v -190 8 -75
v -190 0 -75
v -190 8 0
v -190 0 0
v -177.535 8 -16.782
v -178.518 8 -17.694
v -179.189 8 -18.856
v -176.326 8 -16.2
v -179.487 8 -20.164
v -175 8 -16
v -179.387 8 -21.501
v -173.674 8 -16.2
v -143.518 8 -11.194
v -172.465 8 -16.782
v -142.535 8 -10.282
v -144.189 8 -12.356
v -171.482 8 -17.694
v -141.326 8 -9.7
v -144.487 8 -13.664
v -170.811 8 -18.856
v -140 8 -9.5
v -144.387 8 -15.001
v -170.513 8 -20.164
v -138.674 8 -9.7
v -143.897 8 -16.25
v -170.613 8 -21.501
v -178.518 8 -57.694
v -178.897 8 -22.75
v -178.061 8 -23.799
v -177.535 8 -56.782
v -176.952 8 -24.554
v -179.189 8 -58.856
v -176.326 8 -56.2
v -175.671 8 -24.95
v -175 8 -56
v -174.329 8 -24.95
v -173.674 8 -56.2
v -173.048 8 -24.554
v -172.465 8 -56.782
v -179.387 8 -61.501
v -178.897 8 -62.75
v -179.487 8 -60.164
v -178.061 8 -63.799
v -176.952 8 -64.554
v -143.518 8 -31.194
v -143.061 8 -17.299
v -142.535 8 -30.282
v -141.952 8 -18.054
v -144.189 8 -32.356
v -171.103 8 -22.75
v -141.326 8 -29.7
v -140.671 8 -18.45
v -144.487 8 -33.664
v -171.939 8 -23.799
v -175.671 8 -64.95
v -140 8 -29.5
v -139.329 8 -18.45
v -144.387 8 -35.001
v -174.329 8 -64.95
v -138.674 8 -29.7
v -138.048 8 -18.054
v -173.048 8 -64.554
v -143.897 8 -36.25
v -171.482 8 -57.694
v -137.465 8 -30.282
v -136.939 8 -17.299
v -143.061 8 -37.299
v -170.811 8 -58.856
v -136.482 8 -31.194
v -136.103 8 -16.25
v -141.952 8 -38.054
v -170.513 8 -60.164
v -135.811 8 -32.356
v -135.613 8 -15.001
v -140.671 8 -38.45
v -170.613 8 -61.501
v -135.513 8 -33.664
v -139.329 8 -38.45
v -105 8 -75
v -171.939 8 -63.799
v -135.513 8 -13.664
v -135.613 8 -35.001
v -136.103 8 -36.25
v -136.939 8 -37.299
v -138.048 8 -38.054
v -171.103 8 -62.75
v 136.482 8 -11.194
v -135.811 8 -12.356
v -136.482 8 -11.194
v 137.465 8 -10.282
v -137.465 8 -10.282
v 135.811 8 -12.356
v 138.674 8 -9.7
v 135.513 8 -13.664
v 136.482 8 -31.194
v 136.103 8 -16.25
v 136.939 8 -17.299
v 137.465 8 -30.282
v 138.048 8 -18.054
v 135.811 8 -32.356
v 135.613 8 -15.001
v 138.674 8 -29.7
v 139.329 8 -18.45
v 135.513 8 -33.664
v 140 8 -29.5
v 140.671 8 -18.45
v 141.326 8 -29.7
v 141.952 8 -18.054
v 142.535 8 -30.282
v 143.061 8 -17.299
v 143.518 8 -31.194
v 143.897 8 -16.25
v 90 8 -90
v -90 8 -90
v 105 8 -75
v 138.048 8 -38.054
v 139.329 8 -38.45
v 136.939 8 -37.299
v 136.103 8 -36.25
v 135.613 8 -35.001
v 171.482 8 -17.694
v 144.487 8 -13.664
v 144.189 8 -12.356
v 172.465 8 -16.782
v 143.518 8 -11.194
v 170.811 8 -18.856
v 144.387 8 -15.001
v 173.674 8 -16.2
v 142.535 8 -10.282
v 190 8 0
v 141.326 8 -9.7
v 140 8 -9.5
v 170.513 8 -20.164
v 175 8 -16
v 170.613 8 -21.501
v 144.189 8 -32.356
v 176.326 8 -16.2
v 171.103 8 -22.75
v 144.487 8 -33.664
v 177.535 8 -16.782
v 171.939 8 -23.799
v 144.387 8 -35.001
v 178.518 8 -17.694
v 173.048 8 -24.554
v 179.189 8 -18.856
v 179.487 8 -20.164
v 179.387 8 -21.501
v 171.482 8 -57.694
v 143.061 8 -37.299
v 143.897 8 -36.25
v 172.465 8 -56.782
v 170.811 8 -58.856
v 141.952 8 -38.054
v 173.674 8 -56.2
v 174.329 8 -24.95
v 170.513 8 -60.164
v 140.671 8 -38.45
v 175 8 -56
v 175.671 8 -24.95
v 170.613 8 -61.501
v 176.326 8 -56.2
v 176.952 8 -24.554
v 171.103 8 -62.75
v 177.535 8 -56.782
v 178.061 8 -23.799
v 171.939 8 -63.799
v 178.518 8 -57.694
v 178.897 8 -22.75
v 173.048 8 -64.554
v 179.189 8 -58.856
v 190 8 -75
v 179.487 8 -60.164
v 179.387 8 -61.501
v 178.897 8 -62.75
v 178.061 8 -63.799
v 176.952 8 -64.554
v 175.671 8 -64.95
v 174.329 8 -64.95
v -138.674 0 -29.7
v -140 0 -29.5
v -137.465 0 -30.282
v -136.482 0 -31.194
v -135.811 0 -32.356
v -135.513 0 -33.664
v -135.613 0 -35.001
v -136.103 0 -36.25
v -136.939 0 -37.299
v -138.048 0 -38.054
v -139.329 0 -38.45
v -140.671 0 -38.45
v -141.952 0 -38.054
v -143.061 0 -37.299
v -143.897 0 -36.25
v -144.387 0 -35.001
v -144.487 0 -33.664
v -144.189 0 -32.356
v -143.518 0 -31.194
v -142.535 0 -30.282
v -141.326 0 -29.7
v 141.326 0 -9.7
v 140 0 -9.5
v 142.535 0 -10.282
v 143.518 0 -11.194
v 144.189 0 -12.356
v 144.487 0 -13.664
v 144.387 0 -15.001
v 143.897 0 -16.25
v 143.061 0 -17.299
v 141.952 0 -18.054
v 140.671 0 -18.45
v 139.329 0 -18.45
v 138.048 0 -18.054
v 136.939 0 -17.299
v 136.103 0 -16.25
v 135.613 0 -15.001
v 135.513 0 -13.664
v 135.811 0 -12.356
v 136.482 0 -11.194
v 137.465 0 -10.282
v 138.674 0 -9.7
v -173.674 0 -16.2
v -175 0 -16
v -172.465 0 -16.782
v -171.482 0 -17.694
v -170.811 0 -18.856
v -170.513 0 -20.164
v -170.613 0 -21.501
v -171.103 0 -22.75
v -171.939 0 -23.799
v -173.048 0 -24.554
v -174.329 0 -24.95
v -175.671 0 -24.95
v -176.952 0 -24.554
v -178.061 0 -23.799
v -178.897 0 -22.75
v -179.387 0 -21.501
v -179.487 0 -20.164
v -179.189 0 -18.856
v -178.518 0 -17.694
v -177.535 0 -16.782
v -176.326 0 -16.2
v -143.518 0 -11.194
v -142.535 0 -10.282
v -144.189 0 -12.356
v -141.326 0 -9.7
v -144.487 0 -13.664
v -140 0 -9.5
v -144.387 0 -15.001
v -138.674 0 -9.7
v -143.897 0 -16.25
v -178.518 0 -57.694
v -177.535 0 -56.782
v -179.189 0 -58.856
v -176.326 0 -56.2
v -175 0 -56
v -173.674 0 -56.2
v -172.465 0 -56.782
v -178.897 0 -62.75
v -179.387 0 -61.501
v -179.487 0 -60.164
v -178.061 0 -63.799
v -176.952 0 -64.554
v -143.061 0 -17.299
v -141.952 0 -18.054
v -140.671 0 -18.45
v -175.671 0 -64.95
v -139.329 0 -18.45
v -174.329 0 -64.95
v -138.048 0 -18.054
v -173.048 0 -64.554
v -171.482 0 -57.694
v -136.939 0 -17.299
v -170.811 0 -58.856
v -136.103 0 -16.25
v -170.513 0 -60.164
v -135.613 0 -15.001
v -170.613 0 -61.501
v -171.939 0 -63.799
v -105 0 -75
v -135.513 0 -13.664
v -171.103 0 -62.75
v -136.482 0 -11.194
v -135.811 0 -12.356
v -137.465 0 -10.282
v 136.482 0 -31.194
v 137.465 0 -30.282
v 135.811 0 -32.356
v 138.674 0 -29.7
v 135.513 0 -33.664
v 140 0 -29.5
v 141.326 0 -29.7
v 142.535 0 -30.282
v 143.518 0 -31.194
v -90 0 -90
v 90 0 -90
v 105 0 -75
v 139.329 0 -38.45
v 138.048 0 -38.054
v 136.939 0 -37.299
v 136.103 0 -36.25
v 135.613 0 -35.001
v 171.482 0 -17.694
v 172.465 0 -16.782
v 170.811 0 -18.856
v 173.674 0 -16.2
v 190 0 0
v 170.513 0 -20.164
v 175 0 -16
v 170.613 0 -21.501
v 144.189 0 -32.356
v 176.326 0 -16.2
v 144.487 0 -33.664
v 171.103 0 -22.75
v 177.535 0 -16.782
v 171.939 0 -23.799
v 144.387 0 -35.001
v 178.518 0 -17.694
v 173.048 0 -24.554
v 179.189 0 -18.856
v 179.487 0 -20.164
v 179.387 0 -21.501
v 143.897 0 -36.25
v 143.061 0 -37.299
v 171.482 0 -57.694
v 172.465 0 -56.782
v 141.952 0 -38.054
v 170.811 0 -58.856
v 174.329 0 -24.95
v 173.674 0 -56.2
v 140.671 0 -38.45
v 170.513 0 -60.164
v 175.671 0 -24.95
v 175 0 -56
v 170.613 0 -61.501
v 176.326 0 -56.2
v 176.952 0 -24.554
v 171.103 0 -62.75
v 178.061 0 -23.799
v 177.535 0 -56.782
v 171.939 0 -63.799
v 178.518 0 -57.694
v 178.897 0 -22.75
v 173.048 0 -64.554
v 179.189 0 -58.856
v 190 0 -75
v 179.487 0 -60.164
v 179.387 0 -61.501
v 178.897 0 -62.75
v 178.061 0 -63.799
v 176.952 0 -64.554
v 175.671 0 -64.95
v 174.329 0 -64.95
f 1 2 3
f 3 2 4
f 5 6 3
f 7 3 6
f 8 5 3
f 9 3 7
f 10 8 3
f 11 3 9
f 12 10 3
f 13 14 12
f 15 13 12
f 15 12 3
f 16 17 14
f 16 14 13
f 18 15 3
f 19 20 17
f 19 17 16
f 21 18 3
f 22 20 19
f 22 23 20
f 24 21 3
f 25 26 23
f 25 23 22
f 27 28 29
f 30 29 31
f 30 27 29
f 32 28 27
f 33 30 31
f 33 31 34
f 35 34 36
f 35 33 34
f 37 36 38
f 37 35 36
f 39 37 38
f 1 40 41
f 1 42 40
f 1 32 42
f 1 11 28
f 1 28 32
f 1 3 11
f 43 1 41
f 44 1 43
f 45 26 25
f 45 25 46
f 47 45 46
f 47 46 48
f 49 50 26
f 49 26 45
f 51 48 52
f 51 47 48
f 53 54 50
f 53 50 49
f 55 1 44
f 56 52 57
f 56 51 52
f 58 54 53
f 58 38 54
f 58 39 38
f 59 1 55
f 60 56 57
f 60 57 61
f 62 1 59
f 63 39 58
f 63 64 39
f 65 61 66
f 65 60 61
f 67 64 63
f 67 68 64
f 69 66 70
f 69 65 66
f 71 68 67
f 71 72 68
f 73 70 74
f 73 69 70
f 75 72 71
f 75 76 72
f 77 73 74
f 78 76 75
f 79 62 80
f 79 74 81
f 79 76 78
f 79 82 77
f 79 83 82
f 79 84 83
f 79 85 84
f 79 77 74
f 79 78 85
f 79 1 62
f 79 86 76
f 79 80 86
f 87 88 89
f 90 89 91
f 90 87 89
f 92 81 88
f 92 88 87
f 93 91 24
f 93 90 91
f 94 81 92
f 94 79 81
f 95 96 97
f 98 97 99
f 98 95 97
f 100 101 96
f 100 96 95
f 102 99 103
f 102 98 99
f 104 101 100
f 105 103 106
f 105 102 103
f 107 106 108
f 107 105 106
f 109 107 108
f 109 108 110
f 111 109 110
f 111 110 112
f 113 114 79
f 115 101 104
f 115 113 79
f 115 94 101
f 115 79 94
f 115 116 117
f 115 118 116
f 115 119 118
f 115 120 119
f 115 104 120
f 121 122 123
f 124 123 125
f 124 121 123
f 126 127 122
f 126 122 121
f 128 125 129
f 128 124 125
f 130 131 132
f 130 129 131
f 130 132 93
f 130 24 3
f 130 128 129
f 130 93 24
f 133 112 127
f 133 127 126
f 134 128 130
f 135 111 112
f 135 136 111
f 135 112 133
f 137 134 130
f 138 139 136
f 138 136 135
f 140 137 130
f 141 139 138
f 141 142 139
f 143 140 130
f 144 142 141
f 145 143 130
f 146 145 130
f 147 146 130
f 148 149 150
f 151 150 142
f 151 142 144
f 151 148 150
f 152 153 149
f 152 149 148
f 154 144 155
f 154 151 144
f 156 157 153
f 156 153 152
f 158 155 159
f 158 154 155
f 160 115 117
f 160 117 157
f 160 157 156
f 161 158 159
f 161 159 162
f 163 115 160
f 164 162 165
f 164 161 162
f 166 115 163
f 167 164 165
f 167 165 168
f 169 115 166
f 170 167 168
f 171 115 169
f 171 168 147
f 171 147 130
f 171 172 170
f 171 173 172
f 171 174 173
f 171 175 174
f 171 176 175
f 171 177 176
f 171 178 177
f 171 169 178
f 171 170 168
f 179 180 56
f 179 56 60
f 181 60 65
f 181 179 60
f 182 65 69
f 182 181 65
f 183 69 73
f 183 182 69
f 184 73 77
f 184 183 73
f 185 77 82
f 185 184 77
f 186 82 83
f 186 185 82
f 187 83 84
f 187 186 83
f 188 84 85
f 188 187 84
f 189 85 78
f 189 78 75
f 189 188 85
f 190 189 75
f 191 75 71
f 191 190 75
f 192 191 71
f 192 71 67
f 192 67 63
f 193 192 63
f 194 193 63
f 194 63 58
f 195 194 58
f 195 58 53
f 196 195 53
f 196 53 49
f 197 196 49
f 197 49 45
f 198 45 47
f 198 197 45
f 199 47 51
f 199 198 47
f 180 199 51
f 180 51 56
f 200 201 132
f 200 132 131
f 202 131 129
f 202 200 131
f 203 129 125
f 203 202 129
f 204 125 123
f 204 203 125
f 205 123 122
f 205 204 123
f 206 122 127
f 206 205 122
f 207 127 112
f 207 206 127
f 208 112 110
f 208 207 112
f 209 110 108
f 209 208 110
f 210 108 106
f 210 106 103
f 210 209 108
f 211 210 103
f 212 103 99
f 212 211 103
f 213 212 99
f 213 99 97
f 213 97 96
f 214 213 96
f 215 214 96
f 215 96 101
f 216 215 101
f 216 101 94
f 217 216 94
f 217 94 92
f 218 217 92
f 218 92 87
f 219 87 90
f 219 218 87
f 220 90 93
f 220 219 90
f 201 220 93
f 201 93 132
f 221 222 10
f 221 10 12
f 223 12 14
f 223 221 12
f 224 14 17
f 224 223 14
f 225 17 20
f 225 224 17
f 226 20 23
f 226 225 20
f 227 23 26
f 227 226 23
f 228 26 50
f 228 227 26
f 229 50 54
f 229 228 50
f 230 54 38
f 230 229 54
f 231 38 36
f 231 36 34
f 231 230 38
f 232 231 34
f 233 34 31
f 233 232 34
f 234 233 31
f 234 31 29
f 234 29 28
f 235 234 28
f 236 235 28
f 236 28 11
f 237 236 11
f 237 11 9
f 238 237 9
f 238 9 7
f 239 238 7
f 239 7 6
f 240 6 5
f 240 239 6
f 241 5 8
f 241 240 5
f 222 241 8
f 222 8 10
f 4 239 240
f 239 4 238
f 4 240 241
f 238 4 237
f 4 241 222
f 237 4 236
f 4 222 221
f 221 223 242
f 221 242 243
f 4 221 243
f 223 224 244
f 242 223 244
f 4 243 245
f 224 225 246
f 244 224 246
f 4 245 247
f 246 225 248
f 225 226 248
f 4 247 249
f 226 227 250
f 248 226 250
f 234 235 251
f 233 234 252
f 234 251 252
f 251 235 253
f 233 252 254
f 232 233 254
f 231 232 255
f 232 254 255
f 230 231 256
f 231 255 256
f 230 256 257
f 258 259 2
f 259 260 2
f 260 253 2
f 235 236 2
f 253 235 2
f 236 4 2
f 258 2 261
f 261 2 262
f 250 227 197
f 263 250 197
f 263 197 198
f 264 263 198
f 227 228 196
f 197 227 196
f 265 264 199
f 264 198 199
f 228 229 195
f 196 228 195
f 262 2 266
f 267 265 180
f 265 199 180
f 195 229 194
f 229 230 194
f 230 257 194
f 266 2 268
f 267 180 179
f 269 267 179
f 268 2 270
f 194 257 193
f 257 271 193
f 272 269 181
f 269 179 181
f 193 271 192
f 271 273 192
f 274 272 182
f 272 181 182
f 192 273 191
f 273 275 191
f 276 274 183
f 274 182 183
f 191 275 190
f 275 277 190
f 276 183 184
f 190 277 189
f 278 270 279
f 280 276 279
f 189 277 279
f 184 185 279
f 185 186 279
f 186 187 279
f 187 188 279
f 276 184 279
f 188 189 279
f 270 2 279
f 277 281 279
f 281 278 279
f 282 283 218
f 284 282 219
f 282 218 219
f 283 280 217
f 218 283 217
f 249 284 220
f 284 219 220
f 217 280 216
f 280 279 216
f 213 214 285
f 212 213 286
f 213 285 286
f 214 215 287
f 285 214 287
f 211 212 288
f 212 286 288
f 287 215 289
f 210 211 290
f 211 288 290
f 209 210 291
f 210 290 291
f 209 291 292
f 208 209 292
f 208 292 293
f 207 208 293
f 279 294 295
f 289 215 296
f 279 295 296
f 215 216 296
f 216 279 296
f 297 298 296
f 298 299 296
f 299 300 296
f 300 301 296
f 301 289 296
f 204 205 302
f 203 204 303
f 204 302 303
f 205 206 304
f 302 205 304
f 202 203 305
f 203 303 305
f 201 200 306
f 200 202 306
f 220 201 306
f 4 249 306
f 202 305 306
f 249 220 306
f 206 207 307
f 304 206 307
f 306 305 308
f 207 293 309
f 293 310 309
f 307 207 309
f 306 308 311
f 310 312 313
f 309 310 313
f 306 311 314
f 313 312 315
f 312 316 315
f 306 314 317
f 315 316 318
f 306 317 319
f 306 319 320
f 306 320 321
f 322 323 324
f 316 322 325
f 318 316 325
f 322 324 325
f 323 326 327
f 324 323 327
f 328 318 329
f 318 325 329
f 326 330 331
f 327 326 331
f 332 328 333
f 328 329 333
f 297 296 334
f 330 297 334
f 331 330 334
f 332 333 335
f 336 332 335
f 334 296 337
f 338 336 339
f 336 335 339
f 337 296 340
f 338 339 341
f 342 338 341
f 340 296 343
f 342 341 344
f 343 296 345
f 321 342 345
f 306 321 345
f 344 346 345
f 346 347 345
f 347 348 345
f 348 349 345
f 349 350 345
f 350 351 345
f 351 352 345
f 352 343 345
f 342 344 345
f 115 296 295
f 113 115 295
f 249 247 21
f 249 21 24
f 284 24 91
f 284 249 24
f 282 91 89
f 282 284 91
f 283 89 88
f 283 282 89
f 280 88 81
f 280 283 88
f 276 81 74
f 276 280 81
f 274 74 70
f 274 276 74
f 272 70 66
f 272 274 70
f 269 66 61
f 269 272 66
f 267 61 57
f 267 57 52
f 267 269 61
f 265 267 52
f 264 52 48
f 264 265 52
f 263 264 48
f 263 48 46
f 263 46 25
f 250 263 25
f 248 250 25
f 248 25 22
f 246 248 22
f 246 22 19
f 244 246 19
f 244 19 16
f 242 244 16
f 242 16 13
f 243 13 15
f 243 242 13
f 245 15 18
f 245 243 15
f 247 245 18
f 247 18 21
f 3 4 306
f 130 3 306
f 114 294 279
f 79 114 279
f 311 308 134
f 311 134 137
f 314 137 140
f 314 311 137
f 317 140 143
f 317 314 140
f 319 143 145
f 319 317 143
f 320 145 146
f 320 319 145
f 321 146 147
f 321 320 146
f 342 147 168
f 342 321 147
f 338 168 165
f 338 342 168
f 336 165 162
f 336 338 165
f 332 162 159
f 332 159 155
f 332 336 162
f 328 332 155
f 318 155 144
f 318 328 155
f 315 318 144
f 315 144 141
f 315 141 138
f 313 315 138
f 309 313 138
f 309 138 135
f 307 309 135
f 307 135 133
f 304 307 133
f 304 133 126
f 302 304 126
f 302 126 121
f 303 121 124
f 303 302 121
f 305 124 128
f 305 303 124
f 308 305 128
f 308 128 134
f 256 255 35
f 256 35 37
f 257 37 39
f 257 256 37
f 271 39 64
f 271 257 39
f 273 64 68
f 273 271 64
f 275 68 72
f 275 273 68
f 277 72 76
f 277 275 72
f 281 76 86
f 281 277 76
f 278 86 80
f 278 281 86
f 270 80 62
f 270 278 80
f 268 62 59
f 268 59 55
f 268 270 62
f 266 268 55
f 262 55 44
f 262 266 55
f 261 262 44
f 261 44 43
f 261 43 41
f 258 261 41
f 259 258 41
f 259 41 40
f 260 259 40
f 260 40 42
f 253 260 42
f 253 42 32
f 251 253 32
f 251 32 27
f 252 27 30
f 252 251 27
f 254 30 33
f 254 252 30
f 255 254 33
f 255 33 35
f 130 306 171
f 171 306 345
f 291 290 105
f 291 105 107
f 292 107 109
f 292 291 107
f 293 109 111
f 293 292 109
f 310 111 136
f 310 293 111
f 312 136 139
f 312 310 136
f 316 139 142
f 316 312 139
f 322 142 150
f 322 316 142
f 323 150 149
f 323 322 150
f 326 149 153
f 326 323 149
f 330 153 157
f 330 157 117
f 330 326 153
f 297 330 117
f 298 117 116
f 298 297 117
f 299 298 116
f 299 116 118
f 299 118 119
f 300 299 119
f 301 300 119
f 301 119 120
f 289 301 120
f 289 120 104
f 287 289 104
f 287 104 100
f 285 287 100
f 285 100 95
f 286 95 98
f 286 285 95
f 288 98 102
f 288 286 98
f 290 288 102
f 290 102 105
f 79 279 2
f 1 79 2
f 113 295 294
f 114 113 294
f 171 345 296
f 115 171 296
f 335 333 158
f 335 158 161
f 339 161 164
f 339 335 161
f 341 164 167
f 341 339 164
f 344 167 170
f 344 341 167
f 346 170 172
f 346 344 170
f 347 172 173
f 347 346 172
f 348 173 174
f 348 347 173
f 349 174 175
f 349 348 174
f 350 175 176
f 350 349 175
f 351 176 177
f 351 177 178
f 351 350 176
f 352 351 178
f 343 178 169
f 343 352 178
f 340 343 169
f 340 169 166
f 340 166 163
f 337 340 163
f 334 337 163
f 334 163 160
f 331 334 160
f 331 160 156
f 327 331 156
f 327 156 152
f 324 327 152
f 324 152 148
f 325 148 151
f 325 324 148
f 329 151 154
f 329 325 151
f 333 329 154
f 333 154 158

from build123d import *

# Parameters (mm, degrees)
ESQUISSE1_R        = 4.5
BOSS_EXTRU_1_DEPTH = 8


with BuildPart() as part:
    # Esquisse1 → Boss.-Extru.1 (new body)
    # profile 1 of 2: a face of its own
    with BuildSketch(Plane(origin=(0, 0, 0), x_dir=(1, 0, 0), z_dir=(0, 1, 0))):
        Polygon((-190, 75), (-190, 0), (0, 0), (0, 90), (-90, 90), (-105, 75), align=None)
        with Locations(Location((-175, 20.5, 0), (0, 0, 270))):
            Circle(ESQUISSE1_R, mode=Mode.SUBTRACT)
        with Locations(Location((-140, 14, 0), (0, 0, 270))):
            Circle(ESQUISSE1_R, mode=Mode.SUBTRACT)
        with Locations(Location((-140, 34, 0), (0, 0, 270))):
            Circle(ESQUISSE1_R, mode=Mode.SUBTRACT)
        with Locations(Location((-175, 60.5, 0), (0, 0, 270))):
            Circle(ESQUISSE1_R, mode=Mode.SUBTRACT)
    # profile 2 of 2: a face of its own
    with BuildSketch(Plane(origin=(0, 0, 0), x_dir=(1, 0, 0), z_dir=(0, 1, 0))):
        Polygon((0, 90), (0, 0), (190, 0), (190, 75), (105, 75), (90, 90), align=None)
        with Locations(Location((140, 14, 0), (0, 0, 270))):
            Circle(ESQUISSE1_R, mode=Mode.SUBTRACT)
        with Locations(Location((175, 20.5, 0), (0, 0, 270))):
            Circle(ESQUISSE1_R, mode=Mode.SUBTRACT)
        with Locations(Location((140, 34, 0), (0, 0, 270))):
            Circle(ESQUISSE1_R, mode=Mode.SUBTRACT)
        with Locations(Location((175, 60.5, 0), (0, 0, 270))):
            Circle(ESQUISSE1_R, mode=Mode.SUBTRACT)
    extrude(amount=BOSS_EXTRU_1_DEPTH)


solid = part.part
